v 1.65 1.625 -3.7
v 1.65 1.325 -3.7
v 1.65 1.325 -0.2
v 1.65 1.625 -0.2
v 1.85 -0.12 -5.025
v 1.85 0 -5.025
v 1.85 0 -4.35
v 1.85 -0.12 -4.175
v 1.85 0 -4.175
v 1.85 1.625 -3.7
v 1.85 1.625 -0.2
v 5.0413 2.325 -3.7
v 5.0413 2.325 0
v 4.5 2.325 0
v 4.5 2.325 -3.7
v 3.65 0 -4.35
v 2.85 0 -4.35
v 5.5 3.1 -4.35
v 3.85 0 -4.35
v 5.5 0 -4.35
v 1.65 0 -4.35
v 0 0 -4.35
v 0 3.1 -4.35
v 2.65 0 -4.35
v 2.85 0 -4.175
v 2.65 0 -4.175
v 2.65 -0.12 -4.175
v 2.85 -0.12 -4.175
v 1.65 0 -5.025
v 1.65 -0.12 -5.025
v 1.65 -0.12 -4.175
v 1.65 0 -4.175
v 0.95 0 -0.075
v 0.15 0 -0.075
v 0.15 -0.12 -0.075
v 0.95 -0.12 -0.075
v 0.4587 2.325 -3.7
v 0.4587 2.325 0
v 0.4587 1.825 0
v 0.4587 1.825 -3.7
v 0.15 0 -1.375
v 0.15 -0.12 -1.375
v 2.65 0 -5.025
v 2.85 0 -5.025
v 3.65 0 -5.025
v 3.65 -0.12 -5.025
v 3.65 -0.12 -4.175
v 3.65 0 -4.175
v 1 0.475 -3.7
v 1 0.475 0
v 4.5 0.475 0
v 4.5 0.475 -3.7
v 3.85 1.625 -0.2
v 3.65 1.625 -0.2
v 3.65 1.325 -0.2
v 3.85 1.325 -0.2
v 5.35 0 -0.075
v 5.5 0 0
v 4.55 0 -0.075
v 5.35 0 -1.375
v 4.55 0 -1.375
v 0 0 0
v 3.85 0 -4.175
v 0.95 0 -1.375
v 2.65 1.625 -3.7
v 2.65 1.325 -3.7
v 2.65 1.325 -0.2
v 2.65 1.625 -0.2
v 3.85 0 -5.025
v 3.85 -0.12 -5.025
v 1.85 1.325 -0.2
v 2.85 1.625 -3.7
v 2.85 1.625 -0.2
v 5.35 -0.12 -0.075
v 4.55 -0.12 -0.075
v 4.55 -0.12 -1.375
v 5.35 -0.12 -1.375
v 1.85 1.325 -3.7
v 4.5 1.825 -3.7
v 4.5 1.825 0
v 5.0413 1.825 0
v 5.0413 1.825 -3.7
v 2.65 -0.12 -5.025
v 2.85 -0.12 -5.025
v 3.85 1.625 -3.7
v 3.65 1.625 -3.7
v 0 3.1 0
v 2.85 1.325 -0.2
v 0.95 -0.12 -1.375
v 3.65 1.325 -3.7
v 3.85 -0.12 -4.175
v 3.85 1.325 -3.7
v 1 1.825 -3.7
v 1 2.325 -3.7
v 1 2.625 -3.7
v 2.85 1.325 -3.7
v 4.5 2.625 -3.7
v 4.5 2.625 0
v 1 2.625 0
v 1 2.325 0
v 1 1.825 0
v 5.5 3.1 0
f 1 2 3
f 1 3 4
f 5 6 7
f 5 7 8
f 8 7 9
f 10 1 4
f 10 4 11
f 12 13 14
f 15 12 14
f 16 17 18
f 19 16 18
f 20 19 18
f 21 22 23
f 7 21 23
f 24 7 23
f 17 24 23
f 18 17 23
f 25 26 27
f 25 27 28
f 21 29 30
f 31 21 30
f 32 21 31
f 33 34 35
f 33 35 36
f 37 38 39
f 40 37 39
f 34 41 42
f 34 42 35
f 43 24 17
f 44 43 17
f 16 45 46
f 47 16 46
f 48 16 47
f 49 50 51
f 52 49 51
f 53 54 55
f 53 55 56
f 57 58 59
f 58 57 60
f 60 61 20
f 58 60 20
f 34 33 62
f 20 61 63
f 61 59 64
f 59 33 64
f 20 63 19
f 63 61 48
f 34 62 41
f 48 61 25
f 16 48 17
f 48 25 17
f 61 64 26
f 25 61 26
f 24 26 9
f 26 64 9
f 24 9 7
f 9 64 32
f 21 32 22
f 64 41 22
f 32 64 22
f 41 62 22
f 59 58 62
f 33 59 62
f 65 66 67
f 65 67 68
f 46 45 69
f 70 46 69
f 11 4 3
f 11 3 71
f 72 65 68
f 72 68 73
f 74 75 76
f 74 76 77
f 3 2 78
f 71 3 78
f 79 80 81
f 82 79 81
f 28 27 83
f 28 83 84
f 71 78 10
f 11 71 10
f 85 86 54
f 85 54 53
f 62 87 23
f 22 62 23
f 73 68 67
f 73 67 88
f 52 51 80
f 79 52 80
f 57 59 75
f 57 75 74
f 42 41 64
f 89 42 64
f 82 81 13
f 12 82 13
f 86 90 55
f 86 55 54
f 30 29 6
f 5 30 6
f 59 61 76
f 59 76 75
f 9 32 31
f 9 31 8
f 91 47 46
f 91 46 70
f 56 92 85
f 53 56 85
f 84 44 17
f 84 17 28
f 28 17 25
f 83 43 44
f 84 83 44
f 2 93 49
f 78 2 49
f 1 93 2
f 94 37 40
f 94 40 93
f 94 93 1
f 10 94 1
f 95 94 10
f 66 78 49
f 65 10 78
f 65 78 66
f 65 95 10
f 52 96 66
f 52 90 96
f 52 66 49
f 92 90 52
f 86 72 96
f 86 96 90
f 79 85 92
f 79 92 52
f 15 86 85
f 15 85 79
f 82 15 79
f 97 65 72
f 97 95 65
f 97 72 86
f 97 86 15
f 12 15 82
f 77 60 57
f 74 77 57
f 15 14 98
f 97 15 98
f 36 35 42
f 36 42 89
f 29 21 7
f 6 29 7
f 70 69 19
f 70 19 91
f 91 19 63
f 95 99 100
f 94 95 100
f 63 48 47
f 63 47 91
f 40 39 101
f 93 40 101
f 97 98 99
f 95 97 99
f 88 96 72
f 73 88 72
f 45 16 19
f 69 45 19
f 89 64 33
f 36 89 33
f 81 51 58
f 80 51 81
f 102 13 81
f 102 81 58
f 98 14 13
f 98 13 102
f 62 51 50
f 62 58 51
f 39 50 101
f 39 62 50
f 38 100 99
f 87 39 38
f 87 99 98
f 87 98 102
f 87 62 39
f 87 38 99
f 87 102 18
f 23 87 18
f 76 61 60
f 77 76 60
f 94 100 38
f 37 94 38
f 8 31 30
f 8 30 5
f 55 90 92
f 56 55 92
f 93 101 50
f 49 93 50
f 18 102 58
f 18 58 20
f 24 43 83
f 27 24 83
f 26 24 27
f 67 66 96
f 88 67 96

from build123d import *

# Parameters (mm, degrees)
SKETCH_1_W          = 4.35
SKETCH_1_H          = 3.1
EXTRUDE_1_DEPTH     = 5.5
CUT_EXTRUDE_1_DEPTH = 3.7
SKETCH_4_W          = 0.2
SKETCH_4_H          = 0.3
EXTRUDE_2_DEPTH     = 3.5
SKETCH_5_W          = 0.2
SKETCH_5_H          = 0.85
SKETCH_5_W_2        = 0.8
SKETCH_5_H_2        = 1.3
EXTRUDE_3_DEPTH     = 0.12


with BuildPart() as part:
    # 草图1 → 凸台-拉伸1 (new body)
    with BuildSketch(Plane(origin=(0, 0, 0), x_dir=(0, 0, -1), z_dir=(1, 0, 0))):
        with Locations((2.175, 1.55)):
            Rectangle(SKETCH_1_W, SKETCH_1_H)
    extrude(amount=EXTRUDE_1_DEPTH)

    # 草图2 → 切除-拉伸1 (cut)
    with BuildSketch(Plane.XY):
        Polygon((1, 0.475), (4.5, 0.475), (4.5, 1.825), (5.041281958, 1.825), (5.041281958, 2.325), (4.5, 2.325), (4.5, 2.625), (1, 2.625), (1, 2.325), (0.458718042, 2.325), (0.458718042, 1.825), (1, 1.825), align=None)
    extrude(amount=-CUT_EXTRUDE_1_DEPTH, mode=Mode.SUBTRACT)

    # 草图4 → 凸台-拉伸2 (add)
    with BuildSketch(Plane.XY.offset(-3.7)):
        with Locations((2.75, 1.475)):
            Rectangle(SKETCH_4_W, SKETCH_4_H)
        with Locations((1.75, 1.475)):
            Rectangle(SKETCH_4_W, SKETCH_4_H)
        with Locations((3.75, 1.475)):
            Rectangle(SKETCH_4_W, SKETCH_4_H)
    extrude(amount=EXTRUDE_2_DEPTH)

    # 草图5 → 凸台-拉伸3 (add)
    with BuildSketch(Plane.XZ):
        with Locations((2.75, -4.6)):
            Rectangle(SKETCH_5_W, SKETCH_5_H)
        with Locations((0.55, -0.725)):
            Rectangle(SKETCH_5_W_2, SKETCH_5_H_2)
        with Locations((1.75, -4.6)):
            Rectangle(SKETCH_5_W, SKETCH_5_H)
        with Locations((3.75, -4.6)):
            Rectangle(SKETCH_5_W, SKETCH_5_H)
        with Locations((4.95, -0.725)):
            Rectangle(SKETCH_5_W_2, SKETCH_5_H_2)
    extrude(amount=EXTRUDE_3_DEPTH)


solid = part.part
